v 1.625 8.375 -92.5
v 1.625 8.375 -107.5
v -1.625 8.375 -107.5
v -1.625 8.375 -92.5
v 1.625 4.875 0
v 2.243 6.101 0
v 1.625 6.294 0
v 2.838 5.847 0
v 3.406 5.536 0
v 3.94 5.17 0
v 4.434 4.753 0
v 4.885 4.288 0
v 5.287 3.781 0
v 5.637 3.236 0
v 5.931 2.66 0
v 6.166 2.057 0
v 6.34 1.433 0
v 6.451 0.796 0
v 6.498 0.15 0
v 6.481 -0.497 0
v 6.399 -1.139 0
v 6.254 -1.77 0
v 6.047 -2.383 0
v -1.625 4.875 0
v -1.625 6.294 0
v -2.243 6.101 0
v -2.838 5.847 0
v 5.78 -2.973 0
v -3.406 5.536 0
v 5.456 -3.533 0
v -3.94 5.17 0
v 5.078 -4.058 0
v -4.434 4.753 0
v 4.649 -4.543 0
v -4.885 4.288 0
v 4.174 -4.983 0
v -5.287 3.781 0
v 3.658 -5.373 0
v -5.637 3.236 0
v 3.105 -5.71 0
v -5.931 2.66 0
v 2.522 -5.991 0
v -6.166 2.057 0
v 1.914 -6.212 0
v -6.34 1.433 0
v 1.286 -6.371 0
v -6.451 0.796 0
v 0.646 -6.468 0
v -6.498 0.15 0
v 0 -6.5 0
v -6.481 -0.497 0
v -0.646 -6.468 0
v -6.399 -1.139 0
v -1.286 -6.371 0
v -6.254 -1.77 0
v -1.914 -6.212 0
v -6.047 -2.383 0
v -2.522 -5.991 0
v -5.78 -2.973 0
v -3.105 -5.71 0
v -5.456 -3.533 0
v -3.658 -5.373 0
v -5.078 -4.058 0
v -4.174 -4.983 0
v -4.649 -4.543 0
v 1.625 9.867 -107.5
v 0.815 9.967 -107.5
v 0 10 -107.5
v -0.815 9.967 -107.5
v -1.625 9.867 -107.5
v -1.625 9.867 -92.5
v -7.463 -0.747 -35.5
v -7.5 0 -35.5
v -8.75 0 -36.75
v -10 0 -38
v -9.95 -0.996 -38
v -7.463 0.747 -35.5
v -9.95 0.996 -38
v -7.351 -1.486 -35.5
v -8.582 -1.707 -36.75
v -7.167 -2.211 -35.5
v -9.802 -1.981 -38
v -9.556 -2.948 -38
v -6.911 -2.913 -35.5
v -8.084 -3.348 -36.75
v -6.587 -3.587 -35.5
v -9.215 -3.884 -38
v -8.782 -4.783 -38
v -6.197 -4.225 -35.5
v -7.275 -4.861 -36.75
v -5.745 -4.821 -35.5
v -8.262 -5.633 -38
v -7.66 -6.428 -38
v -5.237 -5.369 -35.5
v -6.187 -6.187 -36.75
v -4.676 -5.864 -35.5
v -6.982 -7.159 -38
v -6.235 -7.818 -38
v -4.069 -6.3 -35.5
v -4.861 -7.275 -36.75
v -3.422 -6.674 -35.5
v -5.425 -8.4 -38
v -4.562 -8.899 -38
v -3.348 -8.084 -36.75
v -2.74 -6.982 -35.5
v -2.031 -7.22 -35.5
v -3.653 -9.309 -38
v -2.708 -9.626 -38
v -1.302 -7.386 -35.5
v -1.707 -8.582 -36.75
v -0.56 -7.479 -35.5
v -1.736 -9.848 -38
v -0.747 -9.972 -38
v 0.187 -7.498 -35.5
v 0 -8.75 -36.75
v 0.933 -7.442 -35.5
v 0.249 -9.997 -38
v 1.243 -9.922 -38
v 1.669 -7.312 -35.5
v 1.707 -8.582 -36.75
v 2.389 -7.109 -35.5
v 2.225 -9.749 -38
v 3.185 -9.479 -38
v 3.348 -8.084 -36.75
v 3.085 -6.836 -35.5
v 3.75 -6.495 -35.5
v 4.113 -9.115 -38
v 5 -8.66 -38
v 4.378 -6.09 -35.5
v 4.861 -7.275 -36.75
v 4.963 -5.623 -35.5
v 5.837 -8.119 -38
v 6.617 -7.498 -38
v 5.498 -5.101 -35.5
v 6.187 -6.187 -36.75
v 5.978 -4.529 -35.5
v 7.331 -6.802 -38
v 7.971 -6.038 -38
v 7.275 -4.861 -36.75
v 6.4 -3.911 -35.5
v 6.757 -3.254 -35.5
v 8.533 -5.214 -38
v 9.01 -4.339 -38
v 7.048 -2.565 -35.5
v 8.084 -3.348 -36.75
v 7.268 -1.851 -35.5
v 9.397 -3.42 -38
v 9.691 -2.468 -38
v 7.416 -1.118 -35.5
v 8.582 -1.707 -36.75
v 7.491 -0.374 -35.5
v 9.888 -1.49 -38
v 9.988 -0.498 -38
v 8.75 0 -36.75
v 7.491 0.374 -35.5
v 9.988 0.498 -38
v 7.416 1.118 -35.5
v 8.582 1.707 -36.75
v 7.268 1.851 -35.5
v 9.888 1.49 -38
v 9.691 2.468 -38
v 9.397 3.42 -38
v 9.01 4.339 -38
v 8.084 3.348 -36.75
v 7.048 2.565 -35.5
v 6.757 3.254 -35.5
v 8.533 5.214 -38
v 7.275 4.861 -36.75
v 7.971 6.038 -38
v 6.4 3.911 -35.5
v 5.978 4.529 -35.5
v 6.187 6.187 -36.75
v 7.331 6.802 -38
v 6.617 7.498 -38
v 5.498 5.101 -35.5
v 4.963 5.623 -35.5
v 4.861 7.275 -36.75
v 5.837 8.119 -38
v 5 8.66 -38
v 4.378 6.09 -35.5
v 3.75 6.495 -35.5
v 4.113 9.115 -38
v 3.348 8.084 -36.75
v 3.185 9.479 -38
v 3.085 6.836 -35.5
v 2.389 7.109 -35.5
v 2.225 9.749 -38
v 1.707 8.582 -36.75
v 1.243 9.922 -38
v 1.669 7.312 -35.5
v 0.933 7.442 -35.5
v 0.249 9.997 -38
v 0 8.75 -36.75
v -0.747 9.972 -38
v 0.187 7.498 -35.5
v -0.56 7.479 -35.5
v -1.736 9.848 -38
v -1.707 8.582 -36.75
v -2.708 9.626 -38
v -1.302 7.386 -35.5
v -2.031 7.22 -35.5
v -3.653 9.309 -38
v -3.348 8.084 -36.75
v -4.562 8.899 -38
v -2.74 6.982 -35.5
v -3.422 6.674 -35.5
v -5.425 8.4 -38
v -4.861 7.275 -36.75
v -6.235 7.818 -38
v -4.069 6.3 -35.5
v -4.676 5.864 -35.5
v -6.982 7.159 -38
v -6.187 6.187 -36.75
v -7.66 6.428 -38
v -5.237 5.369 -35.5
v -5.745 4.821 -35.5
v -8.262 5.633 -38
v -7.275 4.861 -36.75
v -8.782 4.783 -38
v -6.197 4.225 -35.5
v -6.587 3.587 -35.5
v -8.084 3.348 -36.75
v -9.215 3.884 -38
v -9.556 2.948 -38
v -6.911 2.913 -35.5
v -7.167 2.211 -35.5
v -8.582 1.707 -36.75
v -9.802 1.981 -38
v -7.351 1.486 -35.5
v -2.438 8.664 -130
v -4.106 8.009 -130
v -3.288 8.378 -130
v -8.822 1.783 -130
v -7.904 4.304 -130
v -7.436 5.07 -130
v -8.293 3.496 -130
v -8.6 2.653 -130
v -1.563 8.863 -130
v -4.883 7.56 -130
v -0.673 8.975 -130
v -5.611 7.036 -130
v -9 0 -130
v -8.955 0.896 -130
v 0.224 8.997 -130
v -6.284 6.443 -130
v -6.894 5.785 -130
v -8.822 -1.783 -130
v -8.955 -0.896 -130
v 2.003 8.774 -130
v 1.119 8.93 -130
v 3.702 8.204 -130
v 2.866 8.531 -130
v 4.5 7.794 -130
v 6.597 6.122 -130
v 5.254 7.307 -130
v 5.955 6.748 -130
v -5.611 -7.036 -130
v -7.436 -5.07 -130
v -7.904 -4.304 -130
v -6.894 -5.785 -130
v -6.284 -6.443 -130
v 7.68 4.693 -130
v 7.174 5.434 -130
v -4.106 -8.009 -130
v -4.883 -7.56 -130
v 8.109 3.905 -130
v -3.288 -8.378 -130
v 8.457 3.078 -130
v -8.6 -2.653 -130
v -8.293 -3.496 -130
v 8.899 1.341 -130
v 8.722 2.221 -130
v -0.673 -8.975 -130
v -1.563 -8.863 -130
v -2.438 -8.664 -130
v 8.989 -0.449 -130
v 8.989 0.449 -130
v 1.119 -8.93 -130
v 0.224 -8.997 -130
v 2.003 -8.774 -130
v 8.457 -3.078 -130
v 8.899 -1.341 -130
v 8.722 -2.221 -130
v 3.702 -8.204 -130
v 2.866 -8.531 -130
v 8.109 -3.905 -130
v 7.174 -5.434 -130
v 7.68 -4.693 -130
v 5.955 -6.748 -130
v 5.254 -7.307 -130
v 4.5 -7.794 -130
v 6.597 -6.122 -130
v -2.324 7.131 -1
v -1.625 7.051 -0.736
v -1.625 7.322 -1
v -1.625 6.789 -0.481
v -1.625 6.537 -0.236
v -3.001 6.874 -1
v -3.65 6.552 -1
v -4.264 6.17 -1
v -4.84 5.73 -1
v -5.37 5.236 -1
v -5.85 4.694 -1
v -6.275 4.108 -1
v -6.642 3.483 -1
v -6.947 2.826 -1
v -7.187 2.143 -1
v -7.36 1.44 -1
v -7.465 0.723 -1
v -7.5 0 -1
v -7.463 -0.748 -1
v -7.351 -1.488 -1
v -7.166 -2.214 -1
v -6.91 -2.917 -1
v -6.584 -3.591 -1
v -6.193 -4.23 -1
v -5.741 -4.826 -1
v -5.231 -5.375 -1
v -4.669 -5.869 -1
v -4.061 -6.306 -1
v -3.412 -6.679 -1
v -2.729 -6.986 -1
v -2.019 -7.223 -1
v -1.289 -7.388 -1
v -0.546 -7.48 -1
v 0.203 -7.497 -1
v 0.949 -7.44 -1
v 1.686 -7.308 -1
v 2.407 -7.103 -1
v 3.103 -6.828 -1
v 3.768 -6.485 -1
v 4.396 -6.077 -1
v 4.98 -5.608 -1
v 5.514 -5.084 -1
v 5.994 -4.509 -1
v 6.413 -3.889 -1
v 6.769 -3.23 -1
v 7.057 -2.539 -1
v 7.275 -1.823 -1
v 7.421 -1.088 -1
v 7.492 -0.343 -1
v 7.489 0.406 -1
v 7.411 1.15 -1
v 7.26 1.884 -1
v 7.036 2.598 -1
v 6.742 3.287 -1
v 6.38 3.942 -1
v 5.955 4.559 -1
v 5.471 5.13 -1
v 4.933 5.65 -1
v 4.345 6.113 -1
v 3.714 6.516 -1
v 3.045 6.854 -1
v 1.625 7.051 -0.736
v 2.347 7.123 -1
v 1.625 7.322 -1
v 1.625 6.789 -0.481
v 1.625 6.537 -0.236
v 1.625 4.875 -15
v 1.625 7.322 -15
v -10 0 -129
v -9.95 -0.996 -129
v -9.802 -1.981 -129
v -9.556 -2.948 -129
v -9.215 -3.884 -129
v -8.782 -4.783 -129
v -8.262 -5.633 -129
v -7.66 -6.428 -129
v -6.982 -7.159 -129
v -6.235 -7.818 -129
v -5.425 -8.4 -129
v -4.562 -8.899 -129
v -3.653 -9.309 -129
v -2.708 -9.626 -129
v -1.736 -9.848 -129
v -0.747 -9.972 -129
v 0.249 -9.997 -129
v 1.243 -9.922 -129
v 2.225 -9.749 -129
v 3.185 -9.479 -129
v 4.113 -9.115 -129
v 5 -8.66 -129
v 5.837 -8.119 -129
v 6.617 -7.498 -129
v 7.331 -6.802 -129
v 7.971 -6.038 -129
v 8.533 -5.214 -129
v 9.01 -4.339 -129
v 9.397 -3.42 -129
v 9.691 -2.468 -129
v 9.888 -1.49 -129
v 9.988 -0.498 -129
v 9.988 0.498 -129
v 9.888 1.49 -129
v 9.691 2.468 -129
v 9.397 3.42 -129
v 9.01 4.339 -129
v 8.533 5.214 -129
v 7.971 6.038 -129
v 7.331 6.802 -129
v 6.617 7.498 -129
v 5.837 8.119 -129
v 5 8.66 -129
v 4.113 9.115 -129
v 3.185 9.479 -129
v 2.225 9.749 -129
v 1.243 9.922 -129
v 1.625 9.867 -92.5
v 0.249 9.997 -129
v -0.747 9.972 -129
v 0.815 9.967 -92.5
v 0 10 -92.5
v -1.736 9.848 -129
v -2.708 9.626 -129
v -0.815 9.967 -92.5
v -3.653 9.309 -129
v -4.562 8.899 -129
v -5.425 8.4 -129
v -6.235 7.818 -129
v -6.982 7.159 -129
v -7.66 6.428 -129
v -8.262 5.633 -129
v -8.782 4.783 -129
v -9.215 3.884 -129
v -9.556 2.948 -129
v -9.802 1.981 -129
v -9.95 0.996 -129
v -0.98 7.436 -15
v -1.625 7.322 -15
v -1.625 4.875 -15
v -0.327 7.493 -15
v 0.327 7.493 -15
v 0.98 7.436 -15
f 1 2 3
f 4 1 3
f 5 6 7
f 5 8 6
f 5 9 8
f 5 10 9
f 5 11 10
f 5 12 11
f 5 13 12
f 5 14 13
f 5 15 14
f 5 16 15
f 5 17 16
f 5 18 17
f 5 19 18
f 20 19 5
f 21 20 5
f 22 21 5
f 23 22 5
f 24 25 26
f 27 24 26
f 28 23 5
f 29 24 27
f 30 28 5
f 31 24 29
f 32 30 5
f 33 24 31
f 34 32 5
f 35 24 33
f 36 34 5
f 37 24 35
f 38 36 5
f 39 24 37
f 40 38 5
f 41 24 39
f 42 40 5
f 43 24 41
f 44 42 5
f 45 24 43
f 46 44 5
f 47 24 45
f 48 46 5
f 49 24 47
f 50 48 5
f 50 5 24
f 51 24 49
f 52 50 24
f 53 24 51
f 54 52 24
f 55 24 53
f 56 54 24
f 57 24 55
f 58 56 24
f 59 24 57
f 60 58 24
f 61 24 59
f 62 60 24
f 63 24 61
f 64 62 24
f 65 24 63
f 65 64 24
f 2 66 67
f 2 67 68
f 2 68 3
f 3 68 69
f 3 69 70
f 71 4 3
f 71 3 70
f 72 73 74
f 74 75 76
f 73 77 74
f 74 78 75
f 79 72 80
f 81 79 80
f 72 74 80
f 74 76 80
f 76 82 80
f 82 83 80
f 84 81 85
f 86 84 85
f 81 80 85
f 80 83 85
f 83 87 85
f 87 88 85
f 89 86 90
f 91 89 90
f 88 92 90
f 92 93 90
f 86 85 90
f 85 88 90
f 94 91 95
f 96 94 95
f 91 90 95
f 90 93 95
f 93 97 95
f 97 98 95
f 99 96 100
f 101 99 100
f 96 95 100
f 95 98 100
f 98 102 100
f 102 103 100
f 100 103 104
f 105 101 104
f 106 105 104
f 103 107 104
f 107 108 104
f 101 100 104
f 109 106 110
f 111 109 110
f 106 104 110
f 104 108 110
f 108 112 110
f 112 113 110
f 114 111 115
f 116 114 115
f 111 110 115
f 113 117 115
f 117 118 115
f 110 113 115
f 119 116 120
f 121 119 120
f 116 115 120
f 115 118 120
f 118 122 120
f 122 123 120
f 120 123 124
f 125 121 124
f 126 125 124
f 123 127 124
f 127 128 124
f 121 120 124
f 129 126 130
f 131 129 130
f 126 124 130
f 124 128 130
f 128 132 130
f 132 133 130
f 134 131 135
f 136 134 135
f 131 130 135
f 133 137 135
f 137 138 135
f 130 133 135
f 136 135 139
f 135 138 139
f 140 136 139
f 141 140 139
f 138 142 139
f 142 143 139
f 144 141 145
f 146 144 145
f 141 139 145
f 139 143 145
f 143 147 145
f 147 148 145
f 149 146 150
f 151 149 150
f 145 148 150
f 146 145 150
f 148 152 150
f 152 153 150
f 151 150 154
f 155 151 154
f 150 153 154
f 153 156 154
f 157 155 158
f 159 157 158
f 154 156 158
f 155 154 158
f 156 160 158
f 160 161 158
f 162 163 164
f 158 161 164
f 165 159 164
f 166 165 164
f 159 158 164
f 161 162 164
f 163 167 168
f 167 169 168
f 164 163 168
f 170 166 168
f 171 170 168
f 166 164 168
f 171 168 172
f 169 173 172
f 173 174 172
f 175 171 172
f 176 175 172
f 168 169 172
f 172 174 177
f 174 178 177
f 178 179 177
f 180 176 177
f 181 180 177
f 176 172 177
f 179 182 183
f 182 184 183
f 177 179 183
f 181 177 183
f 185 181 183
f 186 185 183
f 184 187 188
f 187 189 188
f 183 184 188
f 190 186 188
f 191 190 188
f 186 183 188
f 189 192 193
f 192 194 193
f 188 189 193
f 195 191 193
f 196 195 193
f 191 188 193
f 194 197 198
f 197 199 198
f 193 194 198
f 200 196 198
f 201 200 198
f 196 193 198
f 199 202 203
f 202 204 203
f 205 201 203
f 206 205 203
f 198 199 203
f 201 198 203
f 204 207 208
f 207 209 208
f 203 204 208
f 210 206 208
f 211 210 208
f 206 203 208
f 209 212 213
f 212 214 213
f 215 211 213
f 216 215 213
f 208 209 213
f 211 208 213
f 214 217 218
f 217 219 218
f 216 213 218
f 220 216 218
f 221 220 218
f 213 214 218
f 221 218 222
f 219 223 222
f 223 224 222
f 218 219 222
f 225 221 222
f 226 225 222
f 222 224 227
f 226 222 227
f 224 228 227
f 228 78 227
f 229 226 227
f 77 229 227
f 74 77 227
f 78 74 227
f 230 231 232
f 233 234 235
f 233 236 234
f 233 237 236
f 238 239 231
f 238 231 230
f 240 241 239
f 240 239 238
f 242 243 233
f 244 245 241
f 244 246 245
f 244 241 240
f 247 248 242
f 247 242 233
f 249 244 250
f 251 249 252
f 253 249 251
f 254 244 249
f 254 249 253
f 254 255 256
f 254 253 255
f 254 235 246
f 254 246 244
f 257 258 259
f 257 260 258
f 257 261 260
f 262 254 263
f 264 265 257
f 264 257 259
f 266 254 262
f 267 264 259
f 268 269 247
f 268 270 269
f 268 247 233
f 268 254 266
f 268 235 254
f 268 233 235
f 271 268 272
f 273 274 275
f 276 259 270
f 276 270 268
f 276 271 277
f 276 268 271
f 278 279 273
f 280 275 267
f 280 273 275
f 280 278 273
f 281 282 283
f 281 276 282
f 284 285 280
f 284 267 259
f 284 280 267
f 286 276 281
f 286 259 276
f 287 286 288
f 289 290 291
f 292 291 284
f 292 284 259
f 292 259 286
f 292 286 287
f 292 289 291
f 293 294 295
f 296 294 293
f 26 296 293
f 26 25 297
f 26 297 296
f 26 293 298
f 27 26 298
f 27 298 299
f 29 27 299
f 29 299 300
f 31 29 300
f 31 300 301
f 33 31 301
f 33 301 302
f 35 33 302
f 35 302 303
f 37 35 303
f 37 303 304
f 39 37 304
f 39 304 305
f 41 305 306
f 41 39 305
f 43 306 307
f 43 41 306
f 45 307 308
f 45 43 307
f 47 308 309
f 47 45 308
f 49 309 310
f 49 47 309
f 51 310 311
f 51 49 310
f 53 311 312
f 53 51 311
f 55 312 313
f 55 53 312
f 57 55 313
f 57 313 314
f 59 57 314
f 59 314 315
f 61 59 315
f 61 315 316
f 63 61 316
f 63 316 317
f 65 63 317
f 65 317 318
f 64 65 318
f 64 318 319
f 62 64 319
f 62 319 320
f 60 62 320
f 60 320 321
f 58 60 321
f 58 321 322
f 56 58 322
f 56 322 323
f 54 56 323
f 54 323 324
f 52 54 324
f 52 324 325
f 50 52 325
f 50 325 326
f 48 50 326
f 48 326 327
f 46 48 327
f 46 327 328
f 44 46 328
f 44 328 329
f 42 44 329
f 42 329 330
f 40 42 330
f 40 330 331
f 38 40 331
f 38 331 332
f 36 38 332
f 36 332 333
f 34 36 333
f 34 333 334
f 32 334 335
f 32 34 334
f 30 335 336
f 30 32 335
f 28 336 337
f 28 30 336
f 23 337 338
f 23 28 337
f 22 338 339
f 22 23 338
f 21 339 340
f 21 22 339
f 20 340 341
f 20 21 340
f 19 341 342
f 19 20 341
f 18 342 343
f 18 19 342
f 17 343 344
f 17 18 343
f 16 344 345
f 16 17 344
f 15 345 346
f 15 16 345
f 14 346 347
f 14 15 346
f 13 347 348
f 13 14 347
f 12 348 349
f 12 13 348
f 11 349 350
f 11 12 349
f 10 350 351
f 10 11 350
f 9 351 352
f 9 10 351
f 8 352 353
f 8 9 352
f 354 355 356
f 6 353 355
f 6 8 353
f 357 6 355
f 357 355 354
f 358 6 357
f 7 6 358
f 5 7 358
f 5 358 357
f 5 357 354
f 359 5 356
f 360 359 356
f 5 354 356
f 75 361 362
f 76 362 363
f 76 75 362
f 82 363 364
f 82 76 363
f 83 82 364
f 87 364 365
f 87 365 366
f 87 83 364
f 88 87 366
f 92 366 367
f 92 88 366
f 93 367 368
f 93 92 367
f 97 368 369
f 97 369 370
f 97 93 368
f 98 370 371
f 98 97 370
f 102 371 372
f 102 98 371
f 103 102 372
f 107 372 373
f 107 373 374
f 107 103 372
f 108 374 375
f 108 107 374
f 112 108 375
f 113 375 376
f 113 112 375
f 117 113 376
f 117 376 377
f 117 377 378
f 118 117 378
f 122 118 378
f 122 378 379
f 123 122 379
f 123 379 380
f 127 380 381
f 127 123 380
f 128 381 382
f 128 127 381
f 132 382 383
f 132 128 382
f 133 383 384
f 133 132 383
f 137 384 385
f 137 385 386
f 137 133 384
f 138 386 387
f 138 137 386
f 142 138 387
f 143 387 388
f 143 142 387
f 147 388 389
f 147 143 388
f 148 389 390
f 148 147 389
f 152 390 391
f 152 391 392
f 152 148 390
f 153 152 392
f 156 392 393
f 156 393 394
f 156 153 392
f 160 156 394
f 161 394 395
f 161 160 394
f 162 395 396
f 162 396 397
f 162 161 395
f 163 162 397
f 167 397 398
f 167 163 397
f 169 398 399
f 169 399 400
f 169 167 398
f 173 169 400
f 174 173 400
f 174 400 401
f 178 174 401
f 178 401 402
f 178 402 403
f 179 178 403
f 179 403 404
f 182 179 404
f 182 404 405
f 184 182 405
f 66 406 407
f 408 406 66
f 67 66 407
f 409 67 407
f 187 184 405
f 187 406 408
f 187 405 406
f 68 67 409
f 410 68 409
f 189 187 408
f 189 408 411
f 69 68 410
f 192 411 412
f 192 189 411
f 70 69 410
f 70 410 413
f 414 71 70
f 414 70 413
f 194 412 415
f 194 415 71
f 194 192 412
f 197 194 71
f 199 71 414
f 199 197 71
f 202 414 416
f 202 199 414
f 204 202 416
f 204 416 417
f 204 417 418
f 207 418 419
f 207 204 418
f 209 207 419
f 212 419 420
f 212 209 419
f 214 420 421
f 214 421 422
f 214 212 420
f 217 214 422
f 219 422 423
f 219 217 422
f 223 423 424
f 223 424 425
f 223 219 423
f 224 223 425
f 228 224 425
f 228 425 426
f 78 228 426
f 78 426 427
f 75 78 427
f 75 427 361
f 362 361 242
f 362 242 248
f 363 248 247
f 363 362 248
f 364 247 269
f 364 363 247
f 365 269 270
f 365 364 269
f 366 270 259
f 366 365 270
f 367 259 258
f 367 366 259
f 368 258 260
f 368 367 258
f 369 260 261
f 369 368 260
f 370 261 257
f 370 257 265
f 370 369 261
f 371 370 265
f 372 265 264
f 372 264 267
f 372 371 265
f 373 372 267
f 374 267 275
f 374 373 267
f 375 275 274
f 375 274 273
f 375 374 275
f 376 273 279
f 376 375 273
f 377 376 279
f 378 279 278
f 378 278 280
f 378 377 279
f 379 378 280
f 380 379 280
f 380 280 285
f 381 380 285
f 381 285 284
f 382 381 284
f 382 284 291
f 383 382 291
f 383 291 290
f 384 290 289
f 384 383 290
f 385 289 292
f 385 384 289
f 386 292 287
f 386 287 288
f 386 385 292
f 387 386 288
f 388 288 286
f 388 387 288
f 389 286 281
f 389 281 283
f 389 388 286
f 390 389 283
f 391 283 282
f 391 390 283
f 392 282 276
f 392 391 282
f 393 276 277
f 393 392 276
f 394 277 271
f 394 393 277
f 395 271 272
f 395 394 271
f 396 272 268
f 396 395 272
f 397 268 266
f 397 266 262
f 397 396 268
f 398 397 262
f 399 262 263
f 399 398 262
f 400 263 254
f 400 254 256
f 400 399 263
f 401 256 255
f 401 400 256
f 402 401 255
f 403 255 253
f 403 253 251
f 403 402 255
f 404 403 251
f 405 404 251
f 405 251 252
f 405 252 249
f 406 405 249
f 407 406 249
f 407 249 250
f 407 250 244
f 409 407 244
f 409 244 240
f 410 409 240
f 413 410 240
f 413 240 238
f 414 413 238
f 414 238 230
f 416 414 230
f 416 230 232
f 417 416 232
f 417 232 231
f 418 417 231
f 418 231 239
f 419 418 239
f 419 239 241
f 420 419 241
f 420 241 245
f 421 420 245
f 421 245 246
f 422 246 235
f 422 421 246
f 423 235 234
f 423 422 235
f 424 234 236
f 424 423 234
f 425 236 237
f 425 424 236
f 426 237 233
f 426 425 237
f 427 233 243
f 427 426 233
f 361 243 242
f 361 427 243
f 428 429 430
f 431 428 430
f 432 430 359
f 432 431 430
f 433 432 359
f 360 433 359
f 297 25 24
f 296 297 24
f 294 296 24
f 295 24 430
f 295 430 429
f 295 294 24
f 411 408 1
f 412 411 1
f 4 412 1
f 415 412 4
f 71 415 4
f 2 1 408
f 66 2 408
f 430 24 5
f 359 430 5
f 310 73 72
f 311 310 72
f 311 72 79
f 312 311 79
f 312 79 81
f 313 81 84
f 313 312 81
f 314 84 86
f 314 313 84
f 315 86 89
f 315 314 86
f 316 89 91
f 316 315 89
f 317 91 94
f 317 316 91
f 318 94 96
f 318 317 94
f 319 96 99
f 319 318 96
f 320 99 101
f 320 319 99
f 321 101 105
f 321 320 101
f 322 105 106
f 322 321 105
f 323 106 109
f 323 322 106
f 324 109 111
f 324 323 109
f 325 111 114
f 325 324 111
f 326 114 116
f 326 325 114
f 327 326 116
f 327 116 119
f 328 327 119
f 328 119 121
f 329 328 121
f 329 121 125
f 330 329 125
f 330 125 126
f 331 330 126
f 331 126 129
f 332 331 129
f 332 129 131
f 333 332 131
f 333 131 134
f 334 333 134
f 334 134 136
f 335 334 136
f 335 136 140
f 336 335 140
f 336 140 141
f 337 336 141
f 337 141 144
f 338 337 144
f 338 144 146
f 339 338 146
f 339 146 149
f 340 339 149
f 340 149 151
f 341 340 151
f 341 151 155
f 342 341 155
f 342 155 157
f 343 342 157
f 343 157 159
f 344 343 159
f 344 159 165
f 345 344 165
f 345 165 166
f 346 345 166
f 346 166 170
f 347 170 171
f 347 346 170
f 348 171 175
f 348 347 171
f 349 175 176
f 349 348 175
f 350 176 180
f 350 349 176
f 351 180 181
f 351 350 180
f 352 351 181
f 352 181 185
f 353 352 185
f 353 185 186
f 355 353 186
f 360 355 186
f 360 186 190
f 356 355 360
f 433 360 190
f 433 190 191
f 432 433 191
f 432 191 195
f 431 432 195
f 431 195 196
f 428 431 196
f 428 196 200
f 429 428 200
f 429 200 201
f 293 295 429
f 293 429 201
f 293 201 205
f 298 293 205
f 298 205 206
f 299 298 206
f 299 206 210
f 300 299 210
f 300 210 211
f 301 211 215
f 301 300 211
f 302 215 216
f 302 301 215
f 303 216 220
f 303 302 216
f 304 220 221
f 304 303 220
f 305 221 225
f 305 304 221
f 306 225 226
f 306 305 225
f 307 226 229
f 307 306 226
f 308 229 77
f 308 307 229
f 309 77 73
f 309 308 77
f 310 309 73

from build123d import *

# Parameters (mm, degrees)
CHAMFER1_SIZE      = 1
SKETCH3_W          = 3.25
SKETCH3_H          = 3.25
CUT_EXTRUDE2_DEPTH = 15
SKETCH4_W          = 3.25
SKETCH4_H          = 3.25
CUT_EXTRUDE3_DEPTH = 15
CHAMFER2_SIZE      = 3


with BuildPart() as part:
    # Sketch1 → Revolve1 (revolve)
    with BuildSketch(Plane(origin=(0, 0, 0), x_dir=(1, 0, 0), z_dir=(0, 1, 0)), mode=Mode.PRIVATE) as revolve1_sk:
        Polygon((10, 35), (7.5, 35), (7.5, 0), (0, 0), (0, 130), (10, 130), align=None)
    revolve(revolve1_sk.sketch.rotate(Axis((0, 0, -130), (0, 0, 1)), 180), axis=Axis((0, 0, -130), (0, 0, 1)))

    # Chamfer1
    chamfer1_edges = [part.edges().sort_by_distance(p)[0] for p in [
        (7.5, 0, 0),
        (10, 0, -130),
    ]]
    chamfer(chamfer1_edges, length=CHAMFER1_SIZE)

    # Sketch3 → Cut-Extrude2 (cut)
    with BuildSketch(Plane(origin=(0, 0, -107.5), x_dir=(-1, 0, 0), z_dir=(0, 0, -1))):
        with Locations((0, 10)):
            Rectangle(SKETCH3_W, SKETCH3_H)
    extrude(amount=-CUT_EXTRUDE2_DEPTH, mode=Mode.SUBTRACT)

    # Sketch4 → Cut-Extrude3 (cut)
    with BuildSketch(Plane.XY):
        with Locations((0, 6.5)):
            Rectangle(SKETCH4_W, SKETCH4_H)
    extrude(amount=-CUT_EXTRUDE3_DEPTH, mode=Mode.SUBTRACT)

    # Chamfer2
    # the kernel refuses this chamfer: 3 mm, written as the material it takes off along each edge
    with BuildSketch(Plane(origin=(0, 0, -35), x_dir=(-1, 0, 0), z_dir=(0, 1, 0))) as chamfer2_piece_1_section:
        Polygon((10 - CHAMFER2_SIZE, 0), (10, -CHAMFER2_SIZE), (10, 0), align=None)
    chamfer2_piece_1 = revolve(axis=Axis((0, 0, -35), (0, 0, 1)), mode=Mode.PRIVATE)
    chamfer2_piece_1 = chamfer2_piece_1 - Plane(origin=(0, 0, -36.746638668), x_dir=(-1, 0, 0), z_dir=(0, 0, 1)) * Cylinder(7.5, 41, mode=Mode.PRIVATE)
    add(chamfer2_piece_1, mode=Mode.SUBTRACT)


solid = part.part
